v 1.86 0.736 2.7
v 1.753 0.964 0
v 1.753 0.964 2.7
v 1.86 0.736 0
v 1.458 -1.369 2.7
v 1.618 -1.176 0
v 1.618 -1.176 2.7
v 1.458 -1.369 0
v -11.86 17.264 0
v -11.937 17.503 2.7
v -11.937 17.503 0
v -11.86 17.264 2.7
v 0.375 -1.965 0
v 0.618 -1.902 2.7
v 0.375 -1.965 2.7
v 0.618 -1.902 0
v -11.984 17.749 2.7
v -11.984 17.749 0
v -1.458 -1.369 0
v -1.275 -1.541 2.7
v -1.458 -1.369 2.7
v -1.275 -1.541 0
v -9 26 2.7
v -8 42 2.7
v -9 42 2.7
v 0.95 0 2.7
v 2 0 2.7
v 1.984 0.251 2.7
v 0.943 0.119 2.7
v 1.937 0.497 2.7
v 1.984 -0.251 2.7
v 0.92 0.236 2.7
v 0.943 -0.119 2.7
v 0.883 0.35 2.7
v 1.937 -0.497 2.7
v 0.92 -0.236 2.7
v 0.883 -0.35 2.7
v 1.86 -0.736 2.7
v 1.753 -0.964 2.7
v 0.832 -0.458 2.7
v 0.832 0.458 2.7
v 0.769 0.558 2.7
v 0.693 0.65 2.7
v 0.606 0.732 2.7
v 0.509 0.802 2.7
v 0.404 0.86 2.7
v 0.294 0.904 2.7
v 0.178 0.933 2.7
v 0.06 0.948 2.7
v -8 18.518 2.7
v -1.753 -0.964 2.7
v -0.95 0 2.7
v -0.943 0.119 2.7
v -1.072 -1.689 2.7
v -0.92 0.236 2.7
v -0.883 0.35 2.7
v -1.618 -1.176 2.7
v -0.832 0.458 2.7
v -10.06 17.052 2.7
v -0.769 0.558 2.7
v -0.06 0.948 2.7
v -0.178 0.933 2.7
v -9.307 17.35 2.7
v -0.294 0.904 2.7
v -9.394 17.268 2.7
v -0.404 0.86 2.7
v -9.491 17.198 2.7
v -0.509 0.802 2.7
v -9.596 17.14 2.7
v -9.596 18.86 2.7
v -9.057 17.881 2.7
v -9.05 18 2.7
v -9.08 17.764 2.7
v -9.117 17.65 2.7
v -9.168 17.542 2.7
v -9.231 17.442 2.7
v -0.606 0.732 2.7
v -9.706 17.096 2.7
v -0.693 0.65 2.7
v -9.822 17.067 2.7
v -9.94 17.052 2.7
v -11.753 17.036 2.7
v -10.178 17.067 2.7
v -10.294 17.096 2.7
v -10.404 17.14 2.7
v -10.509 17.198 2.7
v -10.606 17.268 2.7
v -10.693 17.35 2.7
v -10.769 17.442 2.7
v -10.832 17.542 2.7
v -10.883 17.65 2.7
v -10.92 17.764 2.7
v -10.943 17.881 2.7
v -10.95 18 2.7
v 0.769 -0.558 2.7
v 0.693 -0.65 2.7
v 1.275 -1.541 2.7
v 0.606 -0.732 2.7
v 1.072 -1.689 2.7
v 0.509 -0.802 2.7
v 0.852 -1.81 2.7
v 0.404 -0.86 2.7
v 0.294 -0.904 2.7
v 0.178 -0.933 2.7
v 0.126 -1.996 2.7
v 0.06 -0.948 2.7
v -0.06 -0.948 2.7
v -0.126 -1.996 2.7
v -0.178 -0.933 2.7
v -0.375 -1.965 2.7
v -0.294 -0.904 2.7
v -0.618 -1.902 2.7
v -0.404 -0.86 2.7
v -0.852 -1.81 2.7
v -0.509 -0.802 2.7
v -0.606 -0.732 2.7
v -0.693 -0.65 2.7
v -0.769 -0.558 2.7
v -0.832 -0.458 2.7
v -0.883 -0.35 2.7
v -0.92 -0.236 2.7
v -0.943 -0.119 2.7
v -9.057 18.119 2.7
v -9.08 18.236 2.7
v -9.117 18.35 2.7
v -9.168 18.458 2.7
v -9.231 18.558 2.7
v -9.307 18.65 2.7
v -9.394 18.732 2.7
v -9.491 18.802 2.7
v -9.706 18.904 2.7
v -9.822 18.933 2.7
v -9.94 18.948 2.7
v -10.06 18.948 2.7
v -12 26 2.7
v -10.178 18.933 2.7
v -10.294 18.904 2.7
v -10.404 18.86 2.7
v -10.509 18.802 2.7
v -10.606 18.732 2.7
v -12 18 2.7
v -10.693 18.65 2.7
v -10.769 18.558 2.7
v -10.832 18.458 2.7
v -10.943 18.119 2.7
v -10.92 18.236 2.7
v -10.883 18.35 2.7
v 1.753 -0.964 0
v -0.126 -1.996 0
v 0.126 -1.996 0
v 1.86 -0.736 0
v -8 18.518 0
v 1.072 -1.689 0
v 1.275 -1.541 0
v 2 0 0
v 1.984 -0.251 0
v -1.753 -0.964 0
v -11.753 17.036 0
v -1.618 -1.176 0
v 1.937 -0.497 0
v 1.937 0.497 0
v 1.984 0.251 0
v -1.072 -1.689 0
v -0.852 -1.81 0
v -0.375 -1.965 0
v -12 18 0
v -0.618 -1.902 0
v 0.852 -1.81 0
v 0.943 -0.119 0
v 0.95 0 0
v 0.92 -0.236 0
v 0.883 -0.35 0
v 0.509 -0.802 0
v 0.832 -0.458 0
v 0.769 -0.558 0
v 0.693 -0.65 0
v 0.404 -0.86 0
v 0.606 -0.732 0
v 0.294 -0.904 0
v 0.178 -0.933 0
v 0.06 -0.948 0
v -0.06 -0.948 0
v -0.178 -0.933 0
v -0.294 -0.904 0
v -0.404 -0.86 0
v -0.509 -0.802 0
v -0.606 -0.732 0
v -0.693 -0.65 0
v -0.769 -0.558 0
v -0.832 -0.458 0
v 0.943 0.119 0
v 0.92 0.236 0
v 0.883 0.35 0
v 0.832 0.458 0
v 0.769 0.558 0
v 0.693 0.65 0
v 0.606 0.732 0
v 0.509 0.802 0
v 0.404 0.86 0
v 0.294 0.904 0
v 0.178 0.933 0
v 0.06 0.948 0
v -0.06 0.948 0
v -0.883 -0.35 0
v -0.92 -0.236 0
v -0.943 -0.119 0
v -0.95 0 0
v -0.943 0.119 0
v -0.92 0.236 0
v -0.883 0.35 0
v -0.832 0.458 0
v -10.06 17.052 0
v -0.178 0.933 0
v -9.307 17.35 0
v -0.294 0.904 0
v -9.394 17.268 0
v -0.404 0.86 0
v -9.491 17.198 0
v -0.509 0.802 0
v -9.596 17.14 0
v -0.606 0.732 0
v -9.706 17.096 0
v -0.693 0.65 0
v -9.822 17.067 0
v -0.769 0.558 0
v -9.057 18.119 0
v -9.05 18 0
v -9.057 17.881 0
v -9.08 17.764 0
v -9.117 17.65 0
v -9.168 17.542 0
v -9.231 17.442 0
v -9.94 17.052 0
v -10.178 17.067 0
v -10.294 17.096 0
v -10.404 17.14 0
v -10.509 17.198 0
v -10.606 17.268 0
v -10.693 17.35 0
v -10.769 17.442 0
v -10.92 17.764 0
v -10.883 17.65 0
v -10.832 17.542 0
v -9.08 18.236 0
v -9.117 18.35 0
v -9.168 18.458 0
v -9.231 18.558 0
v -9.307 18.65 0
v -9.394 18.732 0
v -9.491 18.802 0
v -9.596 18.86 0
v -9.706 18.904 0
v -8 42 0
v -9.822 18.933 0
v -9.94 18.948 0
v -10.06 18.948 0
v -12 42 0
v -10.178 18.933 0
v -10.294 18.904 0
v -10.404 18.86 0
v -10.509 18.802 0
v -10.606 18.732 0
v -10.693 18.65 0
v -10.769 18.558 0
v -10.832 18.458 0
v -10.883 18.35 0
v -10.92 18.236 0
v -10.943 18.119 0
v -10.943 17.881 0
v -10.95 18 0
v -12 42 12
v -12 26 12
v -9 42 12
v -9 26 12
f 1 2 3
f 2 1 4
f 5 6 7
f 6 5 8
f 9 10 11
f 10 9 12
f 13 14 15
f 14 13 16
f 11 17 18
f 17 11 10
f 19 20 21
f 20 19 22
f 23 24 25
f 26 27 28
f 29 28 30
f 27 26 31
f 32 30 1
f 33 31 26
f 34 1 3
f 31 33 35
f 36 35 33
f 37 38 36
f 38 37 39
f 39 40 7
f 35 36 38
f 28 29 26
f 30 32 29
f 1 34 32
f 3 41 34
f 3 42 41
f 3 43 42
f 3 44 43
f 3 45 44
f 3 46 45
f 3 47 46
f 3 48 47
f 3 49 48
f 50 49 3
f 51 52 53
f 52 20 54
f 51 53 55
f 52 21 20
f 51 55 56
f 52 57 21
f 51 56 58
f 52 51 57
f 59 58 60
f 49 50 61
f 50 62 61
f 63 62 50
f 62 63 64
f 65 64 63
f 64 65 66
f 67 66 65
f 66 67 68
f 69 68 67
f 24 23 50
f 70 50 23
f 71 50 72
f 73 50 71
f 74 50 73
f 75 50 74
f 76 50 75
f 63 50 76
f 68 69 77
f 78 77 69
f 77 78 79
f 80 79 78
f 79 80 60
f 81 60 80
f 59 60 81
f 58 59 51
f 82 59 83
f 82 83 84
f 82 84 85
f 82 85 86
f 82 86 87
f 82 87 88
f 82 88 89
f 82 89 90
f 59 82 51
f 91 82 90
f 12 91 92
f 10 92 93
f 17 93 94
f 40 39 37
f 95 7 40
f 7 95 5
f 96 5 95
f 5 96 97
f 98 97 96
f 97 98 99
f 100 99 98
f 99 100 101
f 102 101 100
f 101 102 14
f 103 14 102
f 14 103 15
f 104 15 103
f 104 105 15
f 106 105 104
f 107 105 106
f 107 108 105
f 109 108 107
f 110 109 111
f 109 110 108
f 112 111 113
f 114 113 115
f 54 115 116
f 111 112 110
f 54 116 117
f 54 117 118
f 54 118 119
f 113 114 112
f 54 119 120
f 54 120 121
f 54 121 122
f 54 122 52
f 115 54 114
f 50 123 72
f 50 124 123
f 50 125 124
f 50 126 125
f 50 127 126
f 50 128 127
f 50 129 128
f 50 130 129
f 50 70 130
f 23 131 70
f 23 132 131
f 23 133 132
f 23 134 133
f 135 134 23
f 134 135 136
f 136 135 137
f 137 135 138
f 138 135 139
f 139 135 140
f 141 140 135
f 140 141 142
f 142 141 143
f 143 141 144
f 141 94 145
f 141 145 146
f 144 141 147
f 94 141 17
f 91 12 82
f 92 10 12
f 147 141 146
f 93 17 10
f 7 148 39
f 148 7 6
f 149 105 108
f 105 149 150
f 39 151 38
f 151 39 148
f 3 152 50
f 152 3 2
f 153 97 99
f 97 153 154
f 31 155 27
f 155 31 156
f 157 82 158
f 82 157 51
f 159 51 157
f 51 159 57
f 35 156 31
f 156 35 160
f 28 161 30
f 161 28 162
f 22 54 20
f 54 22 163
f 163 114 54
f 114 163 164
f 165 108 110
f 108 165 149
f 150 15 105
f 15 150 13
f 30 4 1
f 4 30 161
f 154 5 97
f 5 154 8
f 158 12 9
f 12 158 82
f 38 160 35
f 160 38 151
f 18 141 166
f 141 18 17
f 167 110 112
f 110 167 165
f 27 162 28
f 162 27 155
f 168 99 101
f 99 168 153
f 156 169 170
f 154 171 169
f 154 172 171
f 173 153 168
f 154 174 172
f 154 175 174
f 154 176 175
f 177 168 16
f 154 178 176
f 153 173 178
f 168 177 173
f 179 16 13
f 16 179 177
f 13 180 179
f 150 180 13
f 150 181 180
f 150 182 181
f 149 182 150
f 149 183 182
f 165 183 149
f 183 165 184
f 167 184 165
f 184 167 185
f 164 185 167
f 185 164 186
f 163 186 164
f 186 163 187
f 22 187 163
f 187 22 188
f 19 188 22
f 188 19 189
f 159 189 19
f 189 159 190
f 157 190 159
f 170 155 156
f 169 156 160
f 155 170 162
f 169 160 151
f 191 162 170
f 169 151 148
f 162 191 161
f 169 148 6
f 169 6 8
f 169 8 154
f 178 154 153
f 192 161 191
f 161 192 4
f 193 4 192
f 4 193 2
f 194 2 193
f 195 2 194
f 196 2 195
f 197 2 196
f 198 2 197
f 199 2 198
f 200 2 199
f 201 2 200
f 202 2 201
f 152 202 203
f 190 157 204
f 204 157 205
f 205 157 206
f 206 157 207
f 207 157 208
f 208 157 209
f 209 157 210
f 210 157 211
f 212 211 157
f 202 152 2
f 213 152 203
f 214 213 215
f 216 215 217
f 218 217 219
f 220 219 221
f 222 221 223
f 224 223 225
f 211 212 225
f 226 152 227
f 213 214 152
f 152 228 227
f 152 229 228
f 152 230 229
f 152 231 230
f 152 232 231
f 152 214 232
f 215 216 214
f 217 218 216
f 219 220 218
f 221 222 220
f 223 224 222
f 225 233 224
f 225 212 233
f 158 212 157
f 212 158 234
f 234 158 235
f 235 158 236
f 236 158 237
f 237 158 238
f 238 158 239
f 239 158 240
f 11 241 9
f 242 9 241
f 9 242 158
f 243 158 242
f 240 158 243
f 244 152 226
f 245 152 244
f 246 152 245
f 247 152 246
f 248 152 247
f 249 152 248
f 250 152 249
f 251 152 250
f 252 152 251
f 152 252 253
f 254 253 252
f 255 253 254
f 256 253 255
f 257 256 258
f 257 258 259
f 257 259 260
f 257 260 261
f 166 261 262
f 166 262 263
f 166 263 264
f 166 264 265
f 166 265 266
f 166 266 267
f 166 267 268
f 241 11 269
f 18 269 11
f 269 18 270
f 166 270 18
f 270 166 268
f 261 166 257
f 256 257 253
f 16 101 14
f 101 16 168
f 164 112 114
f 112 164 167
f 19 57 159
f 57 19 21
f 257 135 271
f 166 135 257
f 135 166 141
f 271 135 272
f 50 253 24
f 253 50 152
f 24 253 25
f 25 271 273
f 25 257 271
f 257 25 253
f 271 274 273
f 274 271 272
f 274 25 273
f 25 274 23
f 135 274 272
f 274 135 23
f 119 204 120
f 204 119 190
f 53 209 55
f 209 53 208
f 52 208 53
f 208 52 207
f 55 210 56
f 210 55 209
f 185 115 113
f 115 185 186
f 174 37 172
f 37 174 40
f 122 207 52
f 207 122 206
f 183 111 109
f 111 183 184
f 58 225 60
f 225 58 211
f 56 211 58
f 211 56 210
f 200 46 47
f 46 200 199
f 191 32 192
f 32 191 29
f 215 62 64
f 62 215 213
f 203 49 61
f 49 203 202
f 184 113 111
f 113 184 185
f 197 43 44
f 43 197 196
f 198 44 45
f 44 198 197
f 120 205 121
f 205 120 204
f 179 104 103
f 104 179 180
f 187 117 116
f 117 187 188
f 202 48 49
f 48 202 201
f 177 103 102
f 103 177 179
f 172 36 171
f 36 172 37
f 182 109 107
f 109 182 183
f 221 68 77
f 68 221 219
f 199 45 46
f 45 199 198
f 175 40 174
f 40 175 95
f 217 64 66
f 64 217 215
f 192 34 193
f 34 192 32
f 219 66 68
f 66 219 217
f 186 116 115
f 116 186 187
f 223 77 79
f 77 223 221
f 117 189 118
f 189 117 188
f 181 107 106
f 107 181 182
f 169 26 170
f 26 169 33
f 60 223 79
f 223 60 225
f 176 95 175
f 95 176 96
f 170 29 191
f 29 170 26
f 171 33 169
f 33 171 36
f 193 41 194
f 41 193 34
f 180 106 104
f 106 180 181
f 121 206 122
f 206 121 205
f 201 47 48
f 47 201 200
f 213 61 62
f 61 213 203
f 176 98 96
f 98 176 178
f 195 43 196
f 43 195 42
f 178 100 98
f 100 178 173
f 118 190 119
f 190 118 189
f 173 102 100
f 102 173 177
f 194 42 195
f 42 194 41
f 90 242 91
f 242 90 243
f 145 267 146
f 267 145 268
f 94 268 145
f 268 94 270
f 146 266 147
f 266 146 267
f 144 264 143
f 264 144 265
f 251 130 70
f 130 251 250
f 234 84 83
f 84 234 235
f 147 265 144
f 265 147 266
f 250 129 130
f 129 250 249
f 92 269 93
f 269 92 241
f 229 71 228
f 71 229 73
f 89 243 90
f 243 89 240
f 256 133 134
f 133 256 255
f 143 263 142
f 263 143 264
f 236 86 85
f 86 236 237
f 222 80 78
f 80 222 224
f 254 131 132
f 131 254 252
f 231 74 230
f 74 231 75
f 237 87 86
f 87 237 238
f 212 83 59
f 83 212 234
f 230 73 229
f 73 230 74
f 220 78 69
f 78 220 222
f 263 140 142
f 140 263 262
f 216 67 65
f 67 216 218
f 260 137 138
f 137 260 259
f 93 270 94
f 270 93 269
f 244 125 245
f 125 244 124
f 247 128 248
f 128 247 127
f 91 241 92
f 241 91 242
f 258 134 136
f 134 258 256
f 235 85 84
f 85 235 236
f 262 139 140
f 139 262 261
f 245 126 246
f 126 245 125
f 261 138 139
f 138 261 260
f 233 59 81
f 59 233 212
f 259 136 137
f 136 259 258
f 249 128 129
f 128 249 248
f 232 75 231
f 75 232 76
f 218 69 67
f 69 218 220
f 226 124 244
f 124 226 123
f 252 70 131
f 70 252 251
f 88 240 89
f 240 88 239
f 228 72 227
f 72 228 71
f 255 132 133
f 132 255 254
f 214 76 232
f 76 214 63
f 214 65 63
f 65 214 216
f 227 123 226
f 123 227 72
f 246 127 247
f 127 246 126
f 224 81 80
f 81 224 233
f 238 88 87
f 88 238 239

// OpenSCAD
$fn = 50;
locked3mm = 2.9;           //hole diameter for a locked/tight/screwed down 2mm screw
freeTurning2mm = 2.5;      //hole diameter for a free turning 2mm screw
locked2mm  = 1.9;            //hole diameter for a locked/tight/screwed down 2mm
thickness = 2.7;           //thickness of the gears and beams etc.
gearRadius = 15;           //radius of the gears (cogs)
leftGearHoleDiameter = freeTurning2mm; //diameter of hole in left gear
rightGearHoleDiameter = 2.1;   //attacing to servo sotiny bit > 2mm (shrinkage)
noTeeth  = 7;              //number of teeth on the gears
teethWidth = 4;            //width of gear teeth
teethBevel = 3;            //diameter of circles at end of teeth
teethHeight = 3.5;         //height of gear teeth
teethBudge = 0.4;         //distances gears need to be appart to fit together
beamWidths = 4;           //width of all beams
beam1Width = beamWidths;    //width of the first beam
beam1Length = 33;          //length of the first beam
beam1HoleDiameter = freeTurning2mm; //diameter of screw hole at end of beam
beam2Width = beamWidths;   //width of the second beam
beam2Length = beam1Length; //length of the second beam
beam2HoleDiameter = freeTurning2mm;//diameter of screw holes at end of beam
beam2CenterDist = 10;       //translating beam2 from beam1 towards the centerline
beam2ForwardDist = 18;     //translatimg beam2 from beam1 in y dir towards the grabber end
servoWidth = 12;           //width of servo
servoLength = 23;          //length of servo
servoHeight = 10.8;        //height of servo bracket (not whole servo)
servoWallThick = 1.2;      //thickness of bracket
servoShaft = 5.9;          //distance of shaft from closest lengthwise edge
gripperArmLength = 24;     //length of nipper
gripperArmThickness = 5;   //thickness of end nippers
gripperArmPadLength = 16;  //length of the raised pad
gripperArmPadThickness = 3;//thickness of the raised pad
gripperArmPadHeight = 12;  //height of the raised pad
gripperArmWidth = beamWidths; //width of end nippers

gearHoleDist = gearRadius * 2 - teethHeight + teethBudge;

//////

armBlockWidth = 15;        //width of block for connecting arms
armBlockLength = 5;         //length ""
armBlockHeight = 9.9 + 5.5;         //height for screws to attach to connecting arms

supportArmLength = 5;      //length of block
supportArmWidth = 15;       //widhth of block
supportArmHeight = armBlockHeight + 20;     //heighrt for screw to attach to the support arm
supportArmDistance = 32;   //distance from little block
supportArmStengthWidth  = 4;  //width of support for support arm block
supportArmStengthLength = 2.5; //length ""


plateWidth = 40.5;           //width of bottom plate
plateLength = 40 + locked3mm + armBlockLength/2;          //length of bottom palte
plateBevelBack = 5;        //bevel radius for back corners of plate
plateBevelFront = 10;      //bevel radius for front corners of plate


module gear(){
   cylinder(r=gearRadius - teethHeight, h = thickness);
   for (i = [0:180/(noTeeth-1):180]){
      rotate(i)
      hull(){
         translate([0,-0.5*teethWidth,0])
         cube([gearRadius - teethHeight, teethWidth, thickness]);
         translate([gearRadius - teethBevel /2, 0, 0])
         cylinder(d = teethBevel, h=thickness, $fn = 25);
      }
   }
}


module leftGear(){
   difference(){
      union(){
         rotate(-(180/(noTeeth-1)) / 2 - 90)
         gear();
         beam1();
      }
      cylinder(d=leftGearHoleDiameter, h=thickness);
   }
}

module rightGear(){
   difference(){
      union(){
         rotate(90)
         gear();
         beam1();
      }
      cylinder(d=rightGearHoleDiameter, h=thickness);
   }  
}

module beam1(){
   difference(){
      union(){
         translate([-0.5 * beam1Width, 0, 0])
         cube([beam1Width, beam1Length - 0.5 * beam1Width, thickness]);
         translate([0, beam1Length - 0.5 * beam1Width, 0])
         cylinder(d=beam1Width, h=thickness);
      }
      translate([0, beam1Length - 0.5 * beam1Width, 0])
      cylinder(d=beam1HoleDiameter, h=thickness);
   }
}

module beam2(){
   difference(){
      union(){
         translate([-0.5 * beam2Width, 0, 0])
         cube([beam2Width, beam2Length - 0.5 * beam2Width, thickness]);
         cylinder(d=beam2Width, h=thickness);
         translate([0,beam2Length - 0.5 * beam2Width, 0])
         cylinder(d=beam2Width, h=thickness);   
      }
      cylinder(d=beam2HoleDiameter, h=thickness);
      translate([0, beam2Length - 0.5 *beam2Width, 0])
      cylinder(d=beam2HoleDiameter, h=thickness);      
   }
}

module bottomPlate(){
   difference (){
      //bottom base plate to cut crap out of
      hull(){
         translate([gearHoleDist/2 - plateWidth/2 + plateBevelFront, plateLength/2 - plateBevelFront, 0])
         cylinder(r=plateBevelFront, h = thickness);
         translate([gearHoleDist/2 + plateWidth/2 - plateBevelFront, plateLength/2 - plateBevelFront, 0])
         cylinder(r=plateBevelFront, h = thickness);
         translate([gearHoleDist/2 - plateWidth/2 + plateBevelBack , -plateLength/2 + plateBevelBack, 0])
         cylinder(r=plateBevelBack, h = thickness);
         translate([gearHoleDist/2 + plateWidth/2 - plateBevelBack , -plateLength/2 + plateBevelBack, 0])
         cylinder(r=plateBevelBack, h = thickness);
      }
      
      /*
      translate([-0.5 * plateLength + 0.5 * gearHoleDist, -0.5 * plateWidth, 0])
      cube([plateLength, plateWidth, thickness]);
      */
      
      //holes for screws of gears and servo mount cutouts
      cylinder(d=locked2mm,h=thickness);
      translate([gearHoleDist -2, 0, 0])
      cube([15, servoWidth, 30], center=true);  
      
      //cutouts for beam 2 bottom hole mounts
      translate([beam2CenterDist, beam2ForwardDist, 0])
      cylinder(d=locked2mm, h=thickness);
      translate([gearHoleDist - beam2CenterDist, beam2ForwardDist, 0])
      cylinder(d=locked2mm, h=thickness);
      
   }
   translate([gearHoleDist, 0, -servoHeight + thickness])
   servoBracket();
   
   //arm block
   translate([gearHoleDist / 2 - armBlockWidth/2, -plateLength/2, -armBlockHeight])
   difference(){
      cube([armBlockWidth, armBlockLength, armBlockHeight + armBlockLength/2]);
      translate([0, armBlockLength/2, armBlockLength/2 ])
      rotate([0, 90, 0])
      cylinder(d = locked3mm, h=armBlockWidth);
   }
   
   //suport arm block
   translate([gearHoleDist / 2 - supportArmWidth/2, -plateLength/2 + armBlockLength/2 + supportArmDistance - supportArmLength/2, -supportArmHeight])
   difference(){
      union(){
         cube([supportArmWidth, supportArmLength, supportArmHeight + supportArmLength/2]);
         translate([supportArmWidth/2-supportArmStengthWidth/2,-supportArmStengthLength,supportArmLength/2+ supportArmHeight - servoHeight])
         cube([supportArmStengthWidth, supportArmStengthLength, servoHeight]);
      }
      translate([0,supportArmLength/2, supportArmLength/2])
      rotate([0, 90, 0])
      cylinder(d=locked3mm, h = supportArmWidth);
   }
         
}

module servoBracket(){
 translate([-(servoLength+2*servoWallThick)/2 - servoShaft,-(servoWidth+2*servoWallThick)/2,0])
 difference(){
   cube([servoLength + 2*servoWallThick, servoWidth + 2*servoWallThick, servoHeight]);
   translate([servoWallThick, servoWallThick, 0])
   cube([servoLength, servoWidth, servoHeight]);
 }   
}

module gripperArm(){
   difference(){
      union(){
         hull(){
            cylinder(d = gripperArmWidth, h = thickness);   
            translate([beam2CenterDist, beam2ForwardDist, 0])
            cylinder(d = gripperArmWidth, h = thickness);
         }
         translate([-0.5 * gripperArmWidth + beam2CenterDist, beam2ForwardDist, 0])
         cube([gripperArmWidth, gripperArmLength, thickness]);

         translate([-0.5 * gripperArmWidth + beam2CenterDist + (gripperArmWidth - gripperArmPadThickness), beam2ForwardDist + (gripperArmLength - gripperArmPadLength), 0])
         cube([gripperArmPadThickness, gripperArmPadLength, gripperArmPadHeight]);
         
      }
      cylinder(d = locked2mm, h = thickness);   
      translate([beam2CenterDist, beam2ForwardDist, 0])
      cylinder(d = locked2mm, h = thickness);
      
   }
}

module leftArm(){
   gripperArm();
}

module rightArm(){
   mirror([1,0,0])
   gripperArm();
}


translate([0,beam1Length - 0.5 * beamWidths,-thickness])
leftArm();

translate([gearHoleDist,beam1Length - 0.5 * beamWidths,-thickness])
!rightArm();

translate([beam2CenterDist,beam2ForwardDist,0])
beam2();

translate([gearHoleDist - beam2CenterDist,beam2ForwardDist,0])
beam2();


translate([0,0,-thickness])
bottomPlate();

leftGear();

translate([gearRadius * 2 - teethHeight + teethBudge,0,0])
rightGear();
